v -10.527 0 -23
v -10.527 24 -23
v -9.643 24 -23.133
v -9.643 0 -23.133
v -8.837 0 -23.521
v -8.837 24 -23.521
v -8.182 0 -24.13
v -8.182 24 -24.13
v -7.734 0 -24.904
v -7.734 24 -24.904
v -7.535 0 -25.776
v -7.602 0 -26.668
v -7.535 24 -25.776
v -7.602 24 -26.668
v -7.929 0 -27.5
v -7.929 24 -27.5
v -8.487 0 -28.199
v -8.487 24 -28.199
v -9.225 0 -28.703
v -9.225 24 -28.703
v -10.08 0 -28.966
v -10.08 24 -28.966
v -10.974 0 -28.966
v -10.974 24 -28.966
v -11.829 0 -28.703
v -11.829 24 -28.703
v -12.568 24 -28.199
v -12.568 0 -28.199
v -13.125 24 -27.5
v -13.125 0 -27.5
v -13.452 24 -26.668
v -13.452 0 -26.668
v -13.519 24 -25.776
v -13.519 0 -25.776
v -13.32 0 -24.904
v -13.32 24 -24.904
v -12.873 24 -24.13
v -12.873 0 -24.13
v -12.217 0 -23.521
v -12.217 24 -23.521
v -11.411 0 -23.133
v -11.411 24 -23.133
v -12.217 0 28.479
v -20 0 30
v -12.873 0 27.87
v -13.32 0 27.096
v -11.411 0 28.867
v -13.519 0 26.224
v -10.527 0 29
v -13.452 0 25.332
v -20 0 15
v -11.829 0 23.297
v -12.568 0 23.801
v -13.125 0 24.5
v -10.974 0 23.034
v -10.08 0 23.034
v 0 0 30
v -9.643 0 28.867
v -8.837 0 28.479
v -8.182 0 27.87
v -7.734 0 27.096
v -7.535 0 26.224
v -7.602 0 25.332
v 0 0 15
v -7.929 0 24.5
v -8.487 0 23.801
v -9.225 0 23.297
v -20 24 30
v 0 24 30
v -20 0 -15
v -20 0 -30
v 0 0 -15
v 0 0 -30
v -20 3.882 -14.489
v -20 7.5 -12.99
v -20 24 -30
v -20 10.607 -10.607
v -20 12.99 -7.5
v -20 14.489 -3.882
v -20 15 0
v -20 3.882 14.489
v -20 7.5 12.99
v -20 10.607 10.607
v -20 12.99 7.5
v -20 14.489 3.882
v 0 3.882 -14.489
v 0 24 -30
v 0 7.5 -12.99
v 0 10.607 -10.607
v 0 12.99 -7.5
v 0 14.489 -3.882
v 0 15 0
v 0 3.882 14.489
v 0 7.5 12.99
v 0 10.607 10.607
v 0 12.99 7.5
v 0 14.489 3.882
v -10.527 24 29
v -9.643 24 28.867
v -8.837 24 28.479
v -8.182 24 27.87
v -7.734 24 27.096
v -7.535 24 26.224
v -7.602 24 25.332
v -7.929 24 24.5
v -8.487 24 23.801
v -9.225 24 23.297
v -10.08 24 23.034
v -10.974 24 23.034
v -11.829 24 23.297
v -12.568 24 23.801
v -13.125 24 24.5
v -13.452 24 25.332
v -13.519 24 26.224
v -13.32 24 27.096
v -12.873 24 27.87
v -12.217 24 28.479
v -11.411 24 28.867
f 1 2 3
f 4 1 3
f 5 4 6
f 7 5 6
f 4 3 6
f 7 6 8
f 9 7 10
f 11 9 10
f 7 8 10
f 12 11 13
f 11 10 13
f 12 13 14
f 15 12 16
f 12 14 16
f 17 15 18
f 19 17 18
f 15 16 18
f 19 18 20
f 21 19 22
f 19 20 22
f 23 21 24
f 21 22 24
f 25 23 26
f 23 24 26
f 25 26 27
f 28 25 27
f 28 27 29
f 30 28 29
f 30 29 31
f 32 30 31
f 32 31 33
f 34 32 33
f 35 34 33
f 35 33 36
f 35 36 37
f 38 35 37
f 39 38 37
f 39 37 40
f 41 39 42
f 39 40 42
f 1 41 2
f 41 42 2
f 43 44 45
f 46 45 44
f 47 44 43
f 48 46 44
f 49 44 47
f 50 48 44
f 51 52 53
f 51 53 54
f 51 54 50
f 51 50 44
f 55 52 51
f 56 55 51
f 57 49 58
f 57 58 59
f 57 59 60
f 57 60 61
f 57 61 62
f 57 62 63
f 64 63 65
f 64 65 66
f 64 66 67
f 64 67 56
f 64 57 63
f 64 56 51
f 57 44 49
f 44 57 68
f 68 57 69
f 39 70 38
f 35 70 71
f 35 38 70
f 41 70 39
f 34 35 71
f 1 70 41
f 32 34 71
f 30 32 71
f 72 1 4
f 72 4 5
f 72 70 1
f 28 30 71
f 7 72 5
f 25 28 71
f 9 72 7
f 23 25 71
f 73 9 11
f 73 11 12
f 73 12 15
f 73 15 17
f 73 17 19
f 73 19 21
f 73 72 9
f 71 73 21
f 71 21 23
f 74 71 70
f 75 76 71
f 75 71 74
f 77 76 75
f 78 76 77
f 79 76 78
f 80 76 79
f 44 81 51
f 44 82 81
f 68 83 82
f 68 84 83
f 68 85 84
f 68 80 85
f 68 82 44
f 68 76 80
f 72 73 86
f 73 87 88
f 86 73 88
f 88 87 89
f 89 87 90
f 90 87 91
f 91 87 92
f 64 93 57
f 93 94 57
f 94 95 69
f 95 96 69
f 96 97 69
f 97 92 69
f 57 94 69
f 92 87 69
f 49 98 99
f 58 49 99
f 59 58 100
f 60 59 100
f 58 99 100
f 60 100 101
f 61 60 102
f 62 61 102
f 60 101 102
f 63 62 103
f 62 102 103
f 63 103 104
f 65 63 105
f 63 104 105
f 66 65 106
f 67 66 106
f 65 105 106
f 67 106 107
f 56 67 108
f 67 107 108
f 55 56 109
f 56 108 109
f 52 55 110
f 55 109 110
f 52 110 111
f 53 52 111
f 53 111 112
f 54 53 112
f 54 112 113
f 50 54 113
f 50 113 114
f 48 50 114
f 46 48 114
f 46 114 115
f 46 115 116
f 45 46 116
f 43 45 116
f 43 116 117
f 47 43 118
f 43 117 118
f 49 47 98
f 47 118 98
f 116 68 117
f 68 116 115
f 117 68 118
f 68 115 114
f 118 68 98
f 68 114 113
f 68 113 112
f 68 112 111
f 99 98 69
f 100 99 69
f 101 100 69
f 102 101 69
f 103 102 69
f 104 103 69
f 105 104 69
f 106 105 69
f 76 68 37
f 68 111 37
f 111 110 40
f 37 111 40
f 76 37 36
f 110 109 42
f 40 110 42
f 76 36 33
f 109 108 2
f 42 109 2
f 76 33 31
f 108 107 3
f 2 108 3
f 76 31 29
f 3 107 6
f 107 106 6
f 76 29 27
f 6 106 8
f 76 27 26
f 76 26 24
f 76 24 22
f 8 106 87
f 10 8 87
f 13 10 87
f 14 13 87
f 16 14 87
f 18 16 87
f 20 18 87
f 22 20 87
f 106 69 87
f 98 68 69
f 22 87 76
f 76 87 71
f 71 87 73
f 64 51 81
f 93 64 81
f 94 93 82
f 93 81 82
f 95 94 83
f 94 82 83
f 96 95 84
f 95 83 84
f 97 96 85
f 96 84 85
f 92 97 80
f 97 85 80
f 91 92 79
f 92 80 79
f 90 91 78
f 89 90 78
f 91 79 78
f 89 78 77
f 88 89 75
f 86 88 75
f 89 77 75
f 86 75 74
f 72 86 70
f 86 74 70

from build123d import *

# Parameters (mm, degrees)
BOSS_EXTRUDE1_DEPTH = 20
SKETCH7_R           = 15
CUT_EXTRUDE1_DEPTH  = 20
SKETCH6_R           = 3
CUT_EXTRUDE2_DEPTH  = 24


with BuildPart() as part:
    # Sketch1 → Boss-Extrude1 (new body)
    with BuildSketch(Plane(origin=(0, 0, 0), x_dir=(0, 0, -1), z_dir=(1, 0, 0))):
        Polygon((0, 0), (-30, 0), (-30, 24), (30, 24), (30, 0), align=None)
    extrude(amount=-BOSS_EXTRUDE1_DEPTH)

    # Sketch7 → Cut-Extrude1 (cut)
    with BuildSketch(Plane.ZY.offset(20)):
        Circle(SKETCH7_R)
    extrude(amount=-CUT_EXTRUDE1_DEPTH, mode=Mode.SUBTRACT)

    # Sketch6 → Cut-Extrude2 (cut)
    with BuildSketch(Plane(origin=(0, 24, 0), x_dir=(1, 0, 0), z_dir=(0, 1, 0))):
        with Locations(Location((-10.527062393, 26, 0), (0, 0, 270))):
            Circle(SKETCH6_R)
        with Locations(Location((-10.527062393, -26, 0), (0, 0, 270))):
            Circle(SKETCH6_R)
    extrude(amount=-CUT_EXTRUDE2_DEPTH, mode=Mode.SUBTRACT)


solid = part.part
